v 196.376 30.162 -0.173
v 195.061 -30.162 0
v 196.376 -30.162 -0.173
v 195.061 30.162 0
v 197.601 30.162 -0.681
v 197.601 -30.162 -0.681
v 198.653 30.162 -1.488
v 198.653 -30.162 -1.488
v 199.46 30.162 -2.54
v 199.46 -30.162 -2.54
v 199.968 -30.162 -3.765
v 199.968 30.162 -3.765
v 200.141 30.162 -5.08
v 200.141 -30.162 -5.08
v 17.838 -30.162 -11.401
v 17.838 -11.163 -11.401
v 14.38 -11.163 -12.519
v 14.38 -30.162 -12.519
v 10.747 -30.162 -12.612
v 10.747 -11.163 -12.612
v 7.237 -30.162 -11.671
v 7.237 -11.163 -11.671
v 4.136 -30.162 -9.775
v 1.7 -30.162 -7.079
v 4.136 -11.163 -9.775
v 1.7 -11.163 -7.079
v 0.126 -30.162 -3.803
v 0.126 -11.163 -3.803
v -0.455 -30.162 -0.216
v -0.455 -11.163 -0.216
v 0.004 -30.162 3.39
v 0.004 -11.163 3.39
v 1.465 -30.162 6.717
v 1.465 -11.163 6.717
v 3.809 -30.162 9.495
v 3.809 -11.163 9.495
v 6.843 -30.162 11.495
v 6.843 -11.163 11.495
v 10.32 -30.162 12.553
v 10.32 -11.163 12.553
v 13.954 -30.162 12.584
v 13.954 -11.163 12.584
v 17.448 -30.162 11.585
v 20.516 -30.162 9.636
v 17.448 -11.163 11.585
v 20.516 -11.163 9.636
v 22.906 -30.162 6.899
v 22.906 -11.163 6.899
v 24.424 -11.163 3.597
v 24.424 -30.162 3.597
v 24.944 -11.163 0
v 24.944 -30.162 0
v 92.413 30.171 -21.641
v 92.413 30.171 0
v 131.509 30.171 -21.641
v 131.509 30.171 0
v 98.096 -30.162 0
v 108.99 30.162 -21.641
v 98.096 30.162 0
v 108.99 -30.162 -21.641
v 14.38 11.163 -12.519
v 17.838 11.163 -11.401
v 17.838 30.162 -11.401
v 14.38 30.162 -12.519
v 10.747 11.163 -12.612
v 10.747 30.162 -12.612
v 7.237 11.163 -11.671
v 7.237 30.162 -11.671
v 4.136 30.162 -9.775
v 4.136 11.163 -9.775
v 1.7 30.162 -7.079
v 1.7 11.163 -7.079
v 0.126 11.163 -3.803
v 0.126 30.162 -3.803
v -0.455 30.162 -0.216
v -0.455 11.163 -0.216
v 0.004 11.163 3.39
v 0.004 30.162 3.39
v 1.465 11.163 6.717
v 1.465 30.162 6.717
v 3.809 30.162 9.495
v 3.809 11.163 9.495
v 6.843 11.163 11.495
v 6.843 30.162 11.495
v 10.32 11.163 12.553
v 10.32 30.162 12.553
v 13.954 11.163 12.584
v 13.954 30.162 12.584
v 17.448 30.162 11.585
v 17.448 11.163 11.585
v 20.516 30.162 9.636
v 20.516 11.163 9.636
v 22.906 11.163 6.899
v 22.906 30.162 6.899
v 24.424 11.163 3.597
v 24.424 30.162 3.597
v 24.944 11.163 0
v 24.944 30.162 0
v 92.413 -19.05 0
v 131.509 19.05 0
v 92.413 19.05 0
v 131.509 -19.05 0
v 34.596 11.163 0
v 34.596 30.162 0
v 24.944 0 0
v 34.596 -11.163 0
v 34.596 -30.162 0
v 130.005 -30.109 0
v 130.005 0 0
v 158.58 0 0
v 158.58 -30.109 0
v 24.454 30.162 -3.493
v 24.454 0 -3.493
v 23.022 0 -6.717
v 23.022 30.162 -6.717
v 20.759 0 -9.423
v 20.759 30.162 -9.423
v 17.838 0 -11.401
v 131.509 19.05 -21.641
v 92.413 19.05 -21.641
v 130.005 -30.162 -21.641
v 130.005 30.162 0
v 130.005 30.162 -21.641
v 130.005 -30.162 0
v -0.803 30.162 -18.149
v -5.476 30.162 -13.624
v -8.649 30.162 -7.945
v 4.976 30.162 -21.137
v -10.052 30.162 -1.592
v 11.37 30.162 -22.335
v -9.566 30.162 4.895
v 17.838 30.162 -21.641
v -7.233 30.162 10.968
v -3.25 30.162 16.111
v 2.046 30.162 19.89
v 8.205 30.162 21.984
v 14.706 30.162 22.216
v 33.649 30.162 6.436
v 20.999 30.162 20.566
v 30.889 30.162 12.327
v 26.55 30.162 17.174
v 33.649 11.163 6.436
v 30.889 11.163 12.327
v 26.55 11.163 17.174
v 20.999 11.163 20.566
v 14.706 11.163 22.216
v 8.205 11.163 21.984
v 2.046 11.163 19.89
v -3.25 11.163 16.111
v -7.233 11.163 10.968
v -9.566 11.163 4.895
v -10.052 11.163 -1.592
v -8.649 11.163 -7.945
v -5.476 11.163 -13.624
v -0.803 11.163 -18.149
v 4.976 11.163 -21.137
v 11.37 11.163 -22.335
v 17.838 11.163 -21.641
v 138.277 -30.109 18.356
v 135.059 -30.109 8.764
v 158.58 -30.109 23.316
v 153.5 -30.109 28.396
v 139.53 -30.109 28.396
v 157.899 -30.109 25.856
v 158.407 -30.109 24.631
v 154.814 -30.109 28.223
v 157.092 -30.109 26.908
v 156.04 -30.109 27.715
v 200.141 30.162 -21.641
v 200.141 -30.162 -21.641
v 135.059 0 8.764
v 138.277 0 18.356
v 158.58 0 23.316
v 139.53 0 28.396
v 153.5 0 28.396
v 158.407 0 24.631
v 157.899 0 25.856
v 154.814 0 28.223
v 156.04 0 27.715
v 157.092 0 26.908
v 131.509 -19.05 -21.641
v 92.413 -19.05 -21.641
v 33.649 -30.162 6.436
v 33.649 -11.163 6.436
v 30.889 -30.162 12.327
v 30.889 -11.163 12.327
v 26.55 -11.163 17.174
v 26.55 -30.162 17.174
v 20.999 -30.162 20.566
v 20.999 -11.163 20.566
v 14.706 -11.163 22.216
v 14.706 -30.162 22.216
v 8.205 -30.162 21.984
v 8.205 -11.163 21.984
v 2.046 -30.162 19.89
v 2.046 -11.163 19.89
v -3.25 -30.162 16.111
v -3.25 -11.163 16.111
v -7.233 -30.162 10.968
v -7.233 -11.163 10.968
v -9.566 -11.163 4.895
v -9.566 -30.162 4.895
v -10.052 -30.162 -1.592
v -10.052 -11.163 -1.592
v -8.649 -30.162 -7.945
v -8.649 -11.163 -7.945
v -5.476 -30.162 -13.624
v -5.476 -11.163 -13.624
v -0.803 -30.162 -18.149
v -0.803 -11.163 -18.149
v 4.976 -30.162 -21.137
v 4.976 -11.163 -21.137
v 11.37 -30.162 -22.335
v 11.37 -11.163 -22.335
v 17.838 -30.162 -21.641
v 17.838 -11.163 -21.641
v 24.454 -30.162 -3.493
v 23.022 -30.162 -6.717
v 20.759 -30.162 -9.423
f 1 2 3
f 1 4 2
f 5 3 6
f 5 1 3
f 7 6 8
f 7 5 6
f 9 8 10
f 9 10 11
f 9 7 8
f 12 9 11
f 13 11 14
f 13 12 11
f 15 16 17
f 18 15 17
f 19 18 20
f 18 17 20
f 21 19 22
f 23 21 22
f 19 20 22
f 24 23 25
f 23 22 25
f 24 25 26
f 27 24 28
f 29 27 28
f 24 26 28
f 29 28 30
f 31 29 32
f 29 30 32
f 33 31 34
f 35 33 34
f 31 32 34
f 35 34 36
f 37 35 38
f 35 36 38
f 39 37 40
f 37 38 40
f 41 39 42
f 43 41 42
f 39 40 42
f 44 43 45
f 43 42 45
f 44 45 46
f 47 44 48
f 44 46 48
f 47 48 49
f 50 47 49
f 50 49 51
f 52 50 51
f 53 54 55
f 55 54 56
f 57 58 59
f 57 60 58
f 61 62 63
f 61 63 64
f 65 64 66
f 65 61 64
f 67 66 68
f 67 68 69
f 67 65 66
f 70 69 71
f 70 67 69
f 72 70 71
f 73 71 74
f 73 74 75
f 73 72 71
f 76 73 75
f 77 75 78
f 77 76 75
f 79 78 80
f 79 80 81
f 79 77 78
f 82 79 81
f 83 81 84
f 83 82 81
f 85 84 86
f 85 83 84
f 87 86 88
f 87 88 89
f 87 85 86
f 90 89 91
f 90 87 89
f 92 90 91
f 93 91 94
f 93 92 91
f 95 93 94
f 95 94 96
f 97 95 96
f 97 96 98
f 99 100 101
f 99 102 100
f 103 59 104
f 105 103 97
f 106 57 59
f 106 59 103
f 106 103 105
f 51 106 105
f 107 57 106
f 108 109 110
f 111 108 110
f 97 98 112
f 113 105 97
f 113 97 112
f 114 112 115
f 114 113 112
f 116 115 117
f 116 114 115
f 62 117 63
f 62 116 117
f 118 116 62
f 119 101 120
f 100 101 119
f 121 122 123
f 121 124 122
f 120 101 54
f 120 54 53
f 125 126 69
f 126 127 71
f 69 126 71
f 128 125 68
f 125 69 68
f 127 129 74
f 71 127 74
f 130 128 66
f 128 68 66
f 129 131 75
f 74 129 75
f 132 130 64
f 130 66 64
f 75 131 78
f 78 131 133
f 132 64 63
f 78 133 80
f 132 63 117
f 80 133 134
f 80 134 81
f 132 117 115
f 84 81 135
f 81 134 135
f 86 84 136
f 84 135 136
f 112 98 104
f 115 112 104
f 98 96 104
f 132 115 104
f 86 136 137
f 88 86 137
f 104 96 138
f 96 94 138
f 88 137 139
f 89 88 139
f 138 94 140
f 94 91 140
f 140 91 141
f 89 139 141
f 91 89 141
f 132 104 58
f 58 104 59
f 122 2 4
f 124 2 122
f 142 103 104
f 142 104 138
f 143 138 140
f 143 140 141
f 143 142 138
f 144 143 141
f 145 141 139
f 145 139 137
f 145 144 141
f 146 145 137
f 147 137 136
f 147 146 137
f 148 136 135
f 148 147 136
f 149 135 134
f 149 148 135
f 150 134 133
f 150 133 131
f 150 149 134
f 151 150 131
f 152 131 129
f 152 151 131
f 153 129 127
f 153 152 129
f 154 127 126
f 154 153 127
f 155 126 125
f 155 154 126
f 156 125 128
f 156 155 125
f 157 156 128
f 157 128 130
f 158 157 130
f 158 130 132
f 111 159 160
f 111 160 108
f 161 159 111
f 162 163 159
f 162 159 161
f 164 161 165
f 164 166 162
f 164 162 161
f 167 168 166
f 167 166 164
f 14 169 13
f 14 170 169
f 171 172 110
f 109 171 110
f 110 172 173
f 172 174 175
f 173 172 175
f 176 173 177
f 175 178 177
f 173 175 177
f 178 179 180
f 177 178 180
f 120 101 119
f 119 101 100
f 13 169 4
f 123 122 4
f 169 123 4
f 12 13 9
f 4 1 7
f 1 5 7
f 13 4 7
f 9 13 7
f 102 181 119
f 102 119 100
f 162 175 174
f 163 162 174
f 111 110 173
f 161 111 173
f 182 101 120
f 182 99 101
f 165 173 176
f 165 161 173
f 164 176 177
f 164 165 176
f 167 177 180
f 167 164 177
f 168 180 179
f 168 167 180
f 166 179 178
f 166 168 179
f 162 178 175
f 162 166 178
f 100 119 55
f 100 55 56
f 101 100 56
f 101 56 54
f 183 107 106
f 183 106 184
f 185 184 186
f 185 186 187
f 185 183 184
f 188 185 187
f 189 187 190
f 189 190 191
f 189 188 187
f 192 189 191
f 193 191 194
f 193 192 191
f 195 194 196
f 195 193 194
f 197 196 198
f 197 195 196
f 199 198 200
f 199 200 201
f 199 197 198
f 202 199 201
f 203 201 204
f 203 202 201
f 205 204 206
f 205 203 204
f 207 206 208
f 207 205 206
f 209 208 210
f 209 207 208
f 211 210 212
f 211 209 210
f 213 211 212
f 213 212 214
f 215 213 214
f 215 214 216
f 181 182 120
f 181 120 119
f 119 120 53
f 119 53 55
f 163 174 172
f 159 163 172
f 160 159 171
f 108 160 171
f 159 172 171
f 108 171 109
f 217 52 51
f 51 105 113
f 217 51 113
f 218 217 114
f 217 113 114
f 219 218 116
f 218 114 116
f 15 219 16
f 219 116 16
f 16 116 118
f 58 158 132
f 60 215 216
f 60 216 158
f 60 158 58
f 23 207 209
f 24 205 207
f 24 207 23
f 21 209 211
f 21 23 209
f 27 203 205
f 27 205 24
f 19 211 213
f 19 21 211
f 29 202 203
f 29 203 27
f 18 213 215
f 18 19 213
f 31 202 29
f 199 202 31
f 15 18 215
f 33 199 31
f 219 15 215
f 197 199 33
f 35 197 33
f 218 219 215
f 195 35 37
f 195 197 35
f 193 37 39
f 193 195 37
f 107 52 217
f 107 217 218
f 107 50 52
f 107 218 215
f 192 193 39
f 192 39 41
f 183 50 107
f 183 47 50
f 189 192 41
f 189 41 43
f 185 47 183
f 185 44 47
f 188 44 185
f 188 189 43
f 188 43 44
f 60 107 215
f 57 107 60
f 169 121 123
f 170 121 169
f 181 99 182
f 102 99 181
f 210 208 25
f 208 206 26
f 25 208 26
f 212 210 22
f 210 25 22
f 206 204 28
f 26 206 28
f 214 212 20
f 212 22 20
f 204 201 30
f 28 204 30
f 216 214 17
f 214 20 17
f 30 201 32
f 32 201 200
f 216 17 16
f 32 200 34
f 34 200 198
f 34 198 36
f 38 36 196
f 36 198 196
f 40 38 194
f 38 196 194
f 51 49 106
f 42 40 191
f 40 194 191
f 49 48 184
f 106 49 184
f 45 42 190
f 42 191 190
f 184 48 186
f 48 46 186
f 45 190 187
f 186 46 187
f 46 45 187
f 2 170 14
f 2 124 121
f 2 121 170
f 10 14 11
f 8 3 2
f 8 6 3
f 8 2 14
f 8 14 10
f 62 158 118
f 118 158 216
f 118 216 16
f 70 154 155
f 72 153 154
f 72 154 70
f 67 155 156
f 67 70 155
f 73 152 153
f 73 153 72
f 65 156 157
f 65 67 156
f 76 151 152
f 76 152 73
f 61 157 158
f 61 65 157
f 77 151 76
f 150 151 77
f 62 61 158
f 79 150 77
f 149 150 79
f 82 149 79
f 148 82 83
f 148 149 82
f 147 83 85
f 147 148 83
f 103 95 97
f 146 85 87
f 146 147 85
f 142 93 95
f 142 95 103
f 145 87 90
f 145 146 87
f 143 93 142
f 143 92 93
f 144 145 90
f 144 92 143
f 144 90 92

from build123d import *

# Parameters (mm, degrees)
F1_DEPTH = 30.1625
F3_DEPTH = 19.05
F4_R     = 5.08
F5_DEPTH = 30.1092732698
F6_R     = 5.08
F7_DEPTH = 11.1207123846
F8_DEPTH = 11.1633


# Not quite as in the source:
# - a feature names something its author has since deleted; it is built from what else it names


with BuildPart() as f1:
    # F0 (on Front) → F1 (new body, symmetric)
    with BuildSketch(Plane.XZ):
        with BuildLine():
            Line((98.0956078965, 0), (34.5956078965, 0))
            ThreePointArc((34.5956078965, 0), (29.9165165739, -13.6850357282), (17.838252592, -21.6405141975))
            Line((17.838252592, -21.6405141975), (108.9896394755, -21.6405141975))
            Line((108.9896394755, -21.6405141975), (98.0956078965, 0))
        make_face()
        with BuildLine():
            Line((34.5956078965, 0), (24.9436078965, 0))
            ThreePointArc((24.9436078965, 0), (23.0218727762, -6.7170682729), (17.838252592, -11.4013135529))
            Line((17.838252592, -11.4013135529), (17.838252592, -21.6405141975))
            ThreePointArc((17.838252592, -21.6405141975), (29.9165165739, -13.6850357282), (34.5956078965, 0))
        make_face()
        with BuildLine():
            ThreePointArc((17.838252592, -11.4013135529), (1.4653430168, 6.7170682729), (24.9436078965, 0))
            Line((24.9436078965, 0), (34.5956078965, 0))
            ThreePointArc((34.5956078965, 0), (-5.4293007808, 13.6850357282), (17.838252592, -21.6405141975))
            Line((17.838252592, -21.6405141975), (17.838252592, -11.4013135529))
        make_face()
    extrude(amount=F1_DEPTH, both=True)

    # F0 (on Front) → F8 (cut, symmetric)
    with BuildSketch(Plane.XZ):
        with BuildLine():
            ThreePointArc((17.838252592, -11.4013135529), (1.4653430168, 6.7170682729), (24.9436078965, 0))
            Line((24.9436078965, 0), (34.5956078965, 0))
            ThreePointArc((34.5956078965, 0), (-5.4293007808, 13.6850357282), (17.838252592, -21.6405141975))
            Line((17.838252592, -21.6405141975), (17.838252592, -11.4013135529))
        make_face()
    extrude(amount=F8_DEPTH, both=True, mode=Mode.SUBTRACT)


with BuildPart() as f1b:
    # F0 (on Front) → F1, piece 2 (new body, symmetric)
    with BuildSketch(Plane.XZ):
        Polygon((130.004652592, 0), (130.004652592, -21.6405141975), (200.1410263589, -21.6405141975), (200.1410263589, 0), (158.579652592, 0), align=None)
    extrude(amount=F1_DEPTH, both=True)

    # F4
    f4_edges = [f1b.edges().sort_by_distance(p)[0] for p in [
        (200.141026, 0, 0),
    ]]
    fillet(f4_edges, radius=F4_R)


with BuildPart() as f3:
    # F2 (on Front) → F3 (new body, symmetric)
    with BuildSketch(Plane.XZ):
        Polygon((131.5081966538, 0), (92.4129226052, 0), (92.4129226052, -21.6405141975), (131.5088617504, -21.6405141975), (131.5088617504, 0), align=None)
    extrude(amount=F3_DEPTH, both=True)


with BuildPart() as f5:
    # F0 (on Front) → F5 (new body)
    with BuildSketch(Plane.XZ):
        with BuildLine():
            ThreePointArc((139.529652592, 28.3959060907), (136.9074278137, 13.4800283762), (130.004652592, 0))
            Line((130.004652592, 0), (158.579652592, 0))
            Line((158.579652592, 0), (158.579652592, 28.3959060907))
            Line((158.579652592, 28.3959060907), (139.529652592, 28.3959060907))
        make_face()
    extrude(amount=F5_DEPTH)

    # F6
    f6_edges = [f5.edges().sort_by_distance(p)[0] for p in [
        (158.579653, -15.054637, 28.395906),
    ]]
    fillet(f6_edges, radius=F6_R)


with BuildPart() as f7:
    # F7 (new): a face of the model
    f7_faces = [f3.part.faces().sort_by_distance(p)[0] for p in [
        (111.9608921778, 19.05, -10.8202570987),
    ]]
    extrude(f7_faces, amount=F7_DEPTH)


solid = Compound([f1.part, f1b.part, f3.part, f5.part, f7.part])
